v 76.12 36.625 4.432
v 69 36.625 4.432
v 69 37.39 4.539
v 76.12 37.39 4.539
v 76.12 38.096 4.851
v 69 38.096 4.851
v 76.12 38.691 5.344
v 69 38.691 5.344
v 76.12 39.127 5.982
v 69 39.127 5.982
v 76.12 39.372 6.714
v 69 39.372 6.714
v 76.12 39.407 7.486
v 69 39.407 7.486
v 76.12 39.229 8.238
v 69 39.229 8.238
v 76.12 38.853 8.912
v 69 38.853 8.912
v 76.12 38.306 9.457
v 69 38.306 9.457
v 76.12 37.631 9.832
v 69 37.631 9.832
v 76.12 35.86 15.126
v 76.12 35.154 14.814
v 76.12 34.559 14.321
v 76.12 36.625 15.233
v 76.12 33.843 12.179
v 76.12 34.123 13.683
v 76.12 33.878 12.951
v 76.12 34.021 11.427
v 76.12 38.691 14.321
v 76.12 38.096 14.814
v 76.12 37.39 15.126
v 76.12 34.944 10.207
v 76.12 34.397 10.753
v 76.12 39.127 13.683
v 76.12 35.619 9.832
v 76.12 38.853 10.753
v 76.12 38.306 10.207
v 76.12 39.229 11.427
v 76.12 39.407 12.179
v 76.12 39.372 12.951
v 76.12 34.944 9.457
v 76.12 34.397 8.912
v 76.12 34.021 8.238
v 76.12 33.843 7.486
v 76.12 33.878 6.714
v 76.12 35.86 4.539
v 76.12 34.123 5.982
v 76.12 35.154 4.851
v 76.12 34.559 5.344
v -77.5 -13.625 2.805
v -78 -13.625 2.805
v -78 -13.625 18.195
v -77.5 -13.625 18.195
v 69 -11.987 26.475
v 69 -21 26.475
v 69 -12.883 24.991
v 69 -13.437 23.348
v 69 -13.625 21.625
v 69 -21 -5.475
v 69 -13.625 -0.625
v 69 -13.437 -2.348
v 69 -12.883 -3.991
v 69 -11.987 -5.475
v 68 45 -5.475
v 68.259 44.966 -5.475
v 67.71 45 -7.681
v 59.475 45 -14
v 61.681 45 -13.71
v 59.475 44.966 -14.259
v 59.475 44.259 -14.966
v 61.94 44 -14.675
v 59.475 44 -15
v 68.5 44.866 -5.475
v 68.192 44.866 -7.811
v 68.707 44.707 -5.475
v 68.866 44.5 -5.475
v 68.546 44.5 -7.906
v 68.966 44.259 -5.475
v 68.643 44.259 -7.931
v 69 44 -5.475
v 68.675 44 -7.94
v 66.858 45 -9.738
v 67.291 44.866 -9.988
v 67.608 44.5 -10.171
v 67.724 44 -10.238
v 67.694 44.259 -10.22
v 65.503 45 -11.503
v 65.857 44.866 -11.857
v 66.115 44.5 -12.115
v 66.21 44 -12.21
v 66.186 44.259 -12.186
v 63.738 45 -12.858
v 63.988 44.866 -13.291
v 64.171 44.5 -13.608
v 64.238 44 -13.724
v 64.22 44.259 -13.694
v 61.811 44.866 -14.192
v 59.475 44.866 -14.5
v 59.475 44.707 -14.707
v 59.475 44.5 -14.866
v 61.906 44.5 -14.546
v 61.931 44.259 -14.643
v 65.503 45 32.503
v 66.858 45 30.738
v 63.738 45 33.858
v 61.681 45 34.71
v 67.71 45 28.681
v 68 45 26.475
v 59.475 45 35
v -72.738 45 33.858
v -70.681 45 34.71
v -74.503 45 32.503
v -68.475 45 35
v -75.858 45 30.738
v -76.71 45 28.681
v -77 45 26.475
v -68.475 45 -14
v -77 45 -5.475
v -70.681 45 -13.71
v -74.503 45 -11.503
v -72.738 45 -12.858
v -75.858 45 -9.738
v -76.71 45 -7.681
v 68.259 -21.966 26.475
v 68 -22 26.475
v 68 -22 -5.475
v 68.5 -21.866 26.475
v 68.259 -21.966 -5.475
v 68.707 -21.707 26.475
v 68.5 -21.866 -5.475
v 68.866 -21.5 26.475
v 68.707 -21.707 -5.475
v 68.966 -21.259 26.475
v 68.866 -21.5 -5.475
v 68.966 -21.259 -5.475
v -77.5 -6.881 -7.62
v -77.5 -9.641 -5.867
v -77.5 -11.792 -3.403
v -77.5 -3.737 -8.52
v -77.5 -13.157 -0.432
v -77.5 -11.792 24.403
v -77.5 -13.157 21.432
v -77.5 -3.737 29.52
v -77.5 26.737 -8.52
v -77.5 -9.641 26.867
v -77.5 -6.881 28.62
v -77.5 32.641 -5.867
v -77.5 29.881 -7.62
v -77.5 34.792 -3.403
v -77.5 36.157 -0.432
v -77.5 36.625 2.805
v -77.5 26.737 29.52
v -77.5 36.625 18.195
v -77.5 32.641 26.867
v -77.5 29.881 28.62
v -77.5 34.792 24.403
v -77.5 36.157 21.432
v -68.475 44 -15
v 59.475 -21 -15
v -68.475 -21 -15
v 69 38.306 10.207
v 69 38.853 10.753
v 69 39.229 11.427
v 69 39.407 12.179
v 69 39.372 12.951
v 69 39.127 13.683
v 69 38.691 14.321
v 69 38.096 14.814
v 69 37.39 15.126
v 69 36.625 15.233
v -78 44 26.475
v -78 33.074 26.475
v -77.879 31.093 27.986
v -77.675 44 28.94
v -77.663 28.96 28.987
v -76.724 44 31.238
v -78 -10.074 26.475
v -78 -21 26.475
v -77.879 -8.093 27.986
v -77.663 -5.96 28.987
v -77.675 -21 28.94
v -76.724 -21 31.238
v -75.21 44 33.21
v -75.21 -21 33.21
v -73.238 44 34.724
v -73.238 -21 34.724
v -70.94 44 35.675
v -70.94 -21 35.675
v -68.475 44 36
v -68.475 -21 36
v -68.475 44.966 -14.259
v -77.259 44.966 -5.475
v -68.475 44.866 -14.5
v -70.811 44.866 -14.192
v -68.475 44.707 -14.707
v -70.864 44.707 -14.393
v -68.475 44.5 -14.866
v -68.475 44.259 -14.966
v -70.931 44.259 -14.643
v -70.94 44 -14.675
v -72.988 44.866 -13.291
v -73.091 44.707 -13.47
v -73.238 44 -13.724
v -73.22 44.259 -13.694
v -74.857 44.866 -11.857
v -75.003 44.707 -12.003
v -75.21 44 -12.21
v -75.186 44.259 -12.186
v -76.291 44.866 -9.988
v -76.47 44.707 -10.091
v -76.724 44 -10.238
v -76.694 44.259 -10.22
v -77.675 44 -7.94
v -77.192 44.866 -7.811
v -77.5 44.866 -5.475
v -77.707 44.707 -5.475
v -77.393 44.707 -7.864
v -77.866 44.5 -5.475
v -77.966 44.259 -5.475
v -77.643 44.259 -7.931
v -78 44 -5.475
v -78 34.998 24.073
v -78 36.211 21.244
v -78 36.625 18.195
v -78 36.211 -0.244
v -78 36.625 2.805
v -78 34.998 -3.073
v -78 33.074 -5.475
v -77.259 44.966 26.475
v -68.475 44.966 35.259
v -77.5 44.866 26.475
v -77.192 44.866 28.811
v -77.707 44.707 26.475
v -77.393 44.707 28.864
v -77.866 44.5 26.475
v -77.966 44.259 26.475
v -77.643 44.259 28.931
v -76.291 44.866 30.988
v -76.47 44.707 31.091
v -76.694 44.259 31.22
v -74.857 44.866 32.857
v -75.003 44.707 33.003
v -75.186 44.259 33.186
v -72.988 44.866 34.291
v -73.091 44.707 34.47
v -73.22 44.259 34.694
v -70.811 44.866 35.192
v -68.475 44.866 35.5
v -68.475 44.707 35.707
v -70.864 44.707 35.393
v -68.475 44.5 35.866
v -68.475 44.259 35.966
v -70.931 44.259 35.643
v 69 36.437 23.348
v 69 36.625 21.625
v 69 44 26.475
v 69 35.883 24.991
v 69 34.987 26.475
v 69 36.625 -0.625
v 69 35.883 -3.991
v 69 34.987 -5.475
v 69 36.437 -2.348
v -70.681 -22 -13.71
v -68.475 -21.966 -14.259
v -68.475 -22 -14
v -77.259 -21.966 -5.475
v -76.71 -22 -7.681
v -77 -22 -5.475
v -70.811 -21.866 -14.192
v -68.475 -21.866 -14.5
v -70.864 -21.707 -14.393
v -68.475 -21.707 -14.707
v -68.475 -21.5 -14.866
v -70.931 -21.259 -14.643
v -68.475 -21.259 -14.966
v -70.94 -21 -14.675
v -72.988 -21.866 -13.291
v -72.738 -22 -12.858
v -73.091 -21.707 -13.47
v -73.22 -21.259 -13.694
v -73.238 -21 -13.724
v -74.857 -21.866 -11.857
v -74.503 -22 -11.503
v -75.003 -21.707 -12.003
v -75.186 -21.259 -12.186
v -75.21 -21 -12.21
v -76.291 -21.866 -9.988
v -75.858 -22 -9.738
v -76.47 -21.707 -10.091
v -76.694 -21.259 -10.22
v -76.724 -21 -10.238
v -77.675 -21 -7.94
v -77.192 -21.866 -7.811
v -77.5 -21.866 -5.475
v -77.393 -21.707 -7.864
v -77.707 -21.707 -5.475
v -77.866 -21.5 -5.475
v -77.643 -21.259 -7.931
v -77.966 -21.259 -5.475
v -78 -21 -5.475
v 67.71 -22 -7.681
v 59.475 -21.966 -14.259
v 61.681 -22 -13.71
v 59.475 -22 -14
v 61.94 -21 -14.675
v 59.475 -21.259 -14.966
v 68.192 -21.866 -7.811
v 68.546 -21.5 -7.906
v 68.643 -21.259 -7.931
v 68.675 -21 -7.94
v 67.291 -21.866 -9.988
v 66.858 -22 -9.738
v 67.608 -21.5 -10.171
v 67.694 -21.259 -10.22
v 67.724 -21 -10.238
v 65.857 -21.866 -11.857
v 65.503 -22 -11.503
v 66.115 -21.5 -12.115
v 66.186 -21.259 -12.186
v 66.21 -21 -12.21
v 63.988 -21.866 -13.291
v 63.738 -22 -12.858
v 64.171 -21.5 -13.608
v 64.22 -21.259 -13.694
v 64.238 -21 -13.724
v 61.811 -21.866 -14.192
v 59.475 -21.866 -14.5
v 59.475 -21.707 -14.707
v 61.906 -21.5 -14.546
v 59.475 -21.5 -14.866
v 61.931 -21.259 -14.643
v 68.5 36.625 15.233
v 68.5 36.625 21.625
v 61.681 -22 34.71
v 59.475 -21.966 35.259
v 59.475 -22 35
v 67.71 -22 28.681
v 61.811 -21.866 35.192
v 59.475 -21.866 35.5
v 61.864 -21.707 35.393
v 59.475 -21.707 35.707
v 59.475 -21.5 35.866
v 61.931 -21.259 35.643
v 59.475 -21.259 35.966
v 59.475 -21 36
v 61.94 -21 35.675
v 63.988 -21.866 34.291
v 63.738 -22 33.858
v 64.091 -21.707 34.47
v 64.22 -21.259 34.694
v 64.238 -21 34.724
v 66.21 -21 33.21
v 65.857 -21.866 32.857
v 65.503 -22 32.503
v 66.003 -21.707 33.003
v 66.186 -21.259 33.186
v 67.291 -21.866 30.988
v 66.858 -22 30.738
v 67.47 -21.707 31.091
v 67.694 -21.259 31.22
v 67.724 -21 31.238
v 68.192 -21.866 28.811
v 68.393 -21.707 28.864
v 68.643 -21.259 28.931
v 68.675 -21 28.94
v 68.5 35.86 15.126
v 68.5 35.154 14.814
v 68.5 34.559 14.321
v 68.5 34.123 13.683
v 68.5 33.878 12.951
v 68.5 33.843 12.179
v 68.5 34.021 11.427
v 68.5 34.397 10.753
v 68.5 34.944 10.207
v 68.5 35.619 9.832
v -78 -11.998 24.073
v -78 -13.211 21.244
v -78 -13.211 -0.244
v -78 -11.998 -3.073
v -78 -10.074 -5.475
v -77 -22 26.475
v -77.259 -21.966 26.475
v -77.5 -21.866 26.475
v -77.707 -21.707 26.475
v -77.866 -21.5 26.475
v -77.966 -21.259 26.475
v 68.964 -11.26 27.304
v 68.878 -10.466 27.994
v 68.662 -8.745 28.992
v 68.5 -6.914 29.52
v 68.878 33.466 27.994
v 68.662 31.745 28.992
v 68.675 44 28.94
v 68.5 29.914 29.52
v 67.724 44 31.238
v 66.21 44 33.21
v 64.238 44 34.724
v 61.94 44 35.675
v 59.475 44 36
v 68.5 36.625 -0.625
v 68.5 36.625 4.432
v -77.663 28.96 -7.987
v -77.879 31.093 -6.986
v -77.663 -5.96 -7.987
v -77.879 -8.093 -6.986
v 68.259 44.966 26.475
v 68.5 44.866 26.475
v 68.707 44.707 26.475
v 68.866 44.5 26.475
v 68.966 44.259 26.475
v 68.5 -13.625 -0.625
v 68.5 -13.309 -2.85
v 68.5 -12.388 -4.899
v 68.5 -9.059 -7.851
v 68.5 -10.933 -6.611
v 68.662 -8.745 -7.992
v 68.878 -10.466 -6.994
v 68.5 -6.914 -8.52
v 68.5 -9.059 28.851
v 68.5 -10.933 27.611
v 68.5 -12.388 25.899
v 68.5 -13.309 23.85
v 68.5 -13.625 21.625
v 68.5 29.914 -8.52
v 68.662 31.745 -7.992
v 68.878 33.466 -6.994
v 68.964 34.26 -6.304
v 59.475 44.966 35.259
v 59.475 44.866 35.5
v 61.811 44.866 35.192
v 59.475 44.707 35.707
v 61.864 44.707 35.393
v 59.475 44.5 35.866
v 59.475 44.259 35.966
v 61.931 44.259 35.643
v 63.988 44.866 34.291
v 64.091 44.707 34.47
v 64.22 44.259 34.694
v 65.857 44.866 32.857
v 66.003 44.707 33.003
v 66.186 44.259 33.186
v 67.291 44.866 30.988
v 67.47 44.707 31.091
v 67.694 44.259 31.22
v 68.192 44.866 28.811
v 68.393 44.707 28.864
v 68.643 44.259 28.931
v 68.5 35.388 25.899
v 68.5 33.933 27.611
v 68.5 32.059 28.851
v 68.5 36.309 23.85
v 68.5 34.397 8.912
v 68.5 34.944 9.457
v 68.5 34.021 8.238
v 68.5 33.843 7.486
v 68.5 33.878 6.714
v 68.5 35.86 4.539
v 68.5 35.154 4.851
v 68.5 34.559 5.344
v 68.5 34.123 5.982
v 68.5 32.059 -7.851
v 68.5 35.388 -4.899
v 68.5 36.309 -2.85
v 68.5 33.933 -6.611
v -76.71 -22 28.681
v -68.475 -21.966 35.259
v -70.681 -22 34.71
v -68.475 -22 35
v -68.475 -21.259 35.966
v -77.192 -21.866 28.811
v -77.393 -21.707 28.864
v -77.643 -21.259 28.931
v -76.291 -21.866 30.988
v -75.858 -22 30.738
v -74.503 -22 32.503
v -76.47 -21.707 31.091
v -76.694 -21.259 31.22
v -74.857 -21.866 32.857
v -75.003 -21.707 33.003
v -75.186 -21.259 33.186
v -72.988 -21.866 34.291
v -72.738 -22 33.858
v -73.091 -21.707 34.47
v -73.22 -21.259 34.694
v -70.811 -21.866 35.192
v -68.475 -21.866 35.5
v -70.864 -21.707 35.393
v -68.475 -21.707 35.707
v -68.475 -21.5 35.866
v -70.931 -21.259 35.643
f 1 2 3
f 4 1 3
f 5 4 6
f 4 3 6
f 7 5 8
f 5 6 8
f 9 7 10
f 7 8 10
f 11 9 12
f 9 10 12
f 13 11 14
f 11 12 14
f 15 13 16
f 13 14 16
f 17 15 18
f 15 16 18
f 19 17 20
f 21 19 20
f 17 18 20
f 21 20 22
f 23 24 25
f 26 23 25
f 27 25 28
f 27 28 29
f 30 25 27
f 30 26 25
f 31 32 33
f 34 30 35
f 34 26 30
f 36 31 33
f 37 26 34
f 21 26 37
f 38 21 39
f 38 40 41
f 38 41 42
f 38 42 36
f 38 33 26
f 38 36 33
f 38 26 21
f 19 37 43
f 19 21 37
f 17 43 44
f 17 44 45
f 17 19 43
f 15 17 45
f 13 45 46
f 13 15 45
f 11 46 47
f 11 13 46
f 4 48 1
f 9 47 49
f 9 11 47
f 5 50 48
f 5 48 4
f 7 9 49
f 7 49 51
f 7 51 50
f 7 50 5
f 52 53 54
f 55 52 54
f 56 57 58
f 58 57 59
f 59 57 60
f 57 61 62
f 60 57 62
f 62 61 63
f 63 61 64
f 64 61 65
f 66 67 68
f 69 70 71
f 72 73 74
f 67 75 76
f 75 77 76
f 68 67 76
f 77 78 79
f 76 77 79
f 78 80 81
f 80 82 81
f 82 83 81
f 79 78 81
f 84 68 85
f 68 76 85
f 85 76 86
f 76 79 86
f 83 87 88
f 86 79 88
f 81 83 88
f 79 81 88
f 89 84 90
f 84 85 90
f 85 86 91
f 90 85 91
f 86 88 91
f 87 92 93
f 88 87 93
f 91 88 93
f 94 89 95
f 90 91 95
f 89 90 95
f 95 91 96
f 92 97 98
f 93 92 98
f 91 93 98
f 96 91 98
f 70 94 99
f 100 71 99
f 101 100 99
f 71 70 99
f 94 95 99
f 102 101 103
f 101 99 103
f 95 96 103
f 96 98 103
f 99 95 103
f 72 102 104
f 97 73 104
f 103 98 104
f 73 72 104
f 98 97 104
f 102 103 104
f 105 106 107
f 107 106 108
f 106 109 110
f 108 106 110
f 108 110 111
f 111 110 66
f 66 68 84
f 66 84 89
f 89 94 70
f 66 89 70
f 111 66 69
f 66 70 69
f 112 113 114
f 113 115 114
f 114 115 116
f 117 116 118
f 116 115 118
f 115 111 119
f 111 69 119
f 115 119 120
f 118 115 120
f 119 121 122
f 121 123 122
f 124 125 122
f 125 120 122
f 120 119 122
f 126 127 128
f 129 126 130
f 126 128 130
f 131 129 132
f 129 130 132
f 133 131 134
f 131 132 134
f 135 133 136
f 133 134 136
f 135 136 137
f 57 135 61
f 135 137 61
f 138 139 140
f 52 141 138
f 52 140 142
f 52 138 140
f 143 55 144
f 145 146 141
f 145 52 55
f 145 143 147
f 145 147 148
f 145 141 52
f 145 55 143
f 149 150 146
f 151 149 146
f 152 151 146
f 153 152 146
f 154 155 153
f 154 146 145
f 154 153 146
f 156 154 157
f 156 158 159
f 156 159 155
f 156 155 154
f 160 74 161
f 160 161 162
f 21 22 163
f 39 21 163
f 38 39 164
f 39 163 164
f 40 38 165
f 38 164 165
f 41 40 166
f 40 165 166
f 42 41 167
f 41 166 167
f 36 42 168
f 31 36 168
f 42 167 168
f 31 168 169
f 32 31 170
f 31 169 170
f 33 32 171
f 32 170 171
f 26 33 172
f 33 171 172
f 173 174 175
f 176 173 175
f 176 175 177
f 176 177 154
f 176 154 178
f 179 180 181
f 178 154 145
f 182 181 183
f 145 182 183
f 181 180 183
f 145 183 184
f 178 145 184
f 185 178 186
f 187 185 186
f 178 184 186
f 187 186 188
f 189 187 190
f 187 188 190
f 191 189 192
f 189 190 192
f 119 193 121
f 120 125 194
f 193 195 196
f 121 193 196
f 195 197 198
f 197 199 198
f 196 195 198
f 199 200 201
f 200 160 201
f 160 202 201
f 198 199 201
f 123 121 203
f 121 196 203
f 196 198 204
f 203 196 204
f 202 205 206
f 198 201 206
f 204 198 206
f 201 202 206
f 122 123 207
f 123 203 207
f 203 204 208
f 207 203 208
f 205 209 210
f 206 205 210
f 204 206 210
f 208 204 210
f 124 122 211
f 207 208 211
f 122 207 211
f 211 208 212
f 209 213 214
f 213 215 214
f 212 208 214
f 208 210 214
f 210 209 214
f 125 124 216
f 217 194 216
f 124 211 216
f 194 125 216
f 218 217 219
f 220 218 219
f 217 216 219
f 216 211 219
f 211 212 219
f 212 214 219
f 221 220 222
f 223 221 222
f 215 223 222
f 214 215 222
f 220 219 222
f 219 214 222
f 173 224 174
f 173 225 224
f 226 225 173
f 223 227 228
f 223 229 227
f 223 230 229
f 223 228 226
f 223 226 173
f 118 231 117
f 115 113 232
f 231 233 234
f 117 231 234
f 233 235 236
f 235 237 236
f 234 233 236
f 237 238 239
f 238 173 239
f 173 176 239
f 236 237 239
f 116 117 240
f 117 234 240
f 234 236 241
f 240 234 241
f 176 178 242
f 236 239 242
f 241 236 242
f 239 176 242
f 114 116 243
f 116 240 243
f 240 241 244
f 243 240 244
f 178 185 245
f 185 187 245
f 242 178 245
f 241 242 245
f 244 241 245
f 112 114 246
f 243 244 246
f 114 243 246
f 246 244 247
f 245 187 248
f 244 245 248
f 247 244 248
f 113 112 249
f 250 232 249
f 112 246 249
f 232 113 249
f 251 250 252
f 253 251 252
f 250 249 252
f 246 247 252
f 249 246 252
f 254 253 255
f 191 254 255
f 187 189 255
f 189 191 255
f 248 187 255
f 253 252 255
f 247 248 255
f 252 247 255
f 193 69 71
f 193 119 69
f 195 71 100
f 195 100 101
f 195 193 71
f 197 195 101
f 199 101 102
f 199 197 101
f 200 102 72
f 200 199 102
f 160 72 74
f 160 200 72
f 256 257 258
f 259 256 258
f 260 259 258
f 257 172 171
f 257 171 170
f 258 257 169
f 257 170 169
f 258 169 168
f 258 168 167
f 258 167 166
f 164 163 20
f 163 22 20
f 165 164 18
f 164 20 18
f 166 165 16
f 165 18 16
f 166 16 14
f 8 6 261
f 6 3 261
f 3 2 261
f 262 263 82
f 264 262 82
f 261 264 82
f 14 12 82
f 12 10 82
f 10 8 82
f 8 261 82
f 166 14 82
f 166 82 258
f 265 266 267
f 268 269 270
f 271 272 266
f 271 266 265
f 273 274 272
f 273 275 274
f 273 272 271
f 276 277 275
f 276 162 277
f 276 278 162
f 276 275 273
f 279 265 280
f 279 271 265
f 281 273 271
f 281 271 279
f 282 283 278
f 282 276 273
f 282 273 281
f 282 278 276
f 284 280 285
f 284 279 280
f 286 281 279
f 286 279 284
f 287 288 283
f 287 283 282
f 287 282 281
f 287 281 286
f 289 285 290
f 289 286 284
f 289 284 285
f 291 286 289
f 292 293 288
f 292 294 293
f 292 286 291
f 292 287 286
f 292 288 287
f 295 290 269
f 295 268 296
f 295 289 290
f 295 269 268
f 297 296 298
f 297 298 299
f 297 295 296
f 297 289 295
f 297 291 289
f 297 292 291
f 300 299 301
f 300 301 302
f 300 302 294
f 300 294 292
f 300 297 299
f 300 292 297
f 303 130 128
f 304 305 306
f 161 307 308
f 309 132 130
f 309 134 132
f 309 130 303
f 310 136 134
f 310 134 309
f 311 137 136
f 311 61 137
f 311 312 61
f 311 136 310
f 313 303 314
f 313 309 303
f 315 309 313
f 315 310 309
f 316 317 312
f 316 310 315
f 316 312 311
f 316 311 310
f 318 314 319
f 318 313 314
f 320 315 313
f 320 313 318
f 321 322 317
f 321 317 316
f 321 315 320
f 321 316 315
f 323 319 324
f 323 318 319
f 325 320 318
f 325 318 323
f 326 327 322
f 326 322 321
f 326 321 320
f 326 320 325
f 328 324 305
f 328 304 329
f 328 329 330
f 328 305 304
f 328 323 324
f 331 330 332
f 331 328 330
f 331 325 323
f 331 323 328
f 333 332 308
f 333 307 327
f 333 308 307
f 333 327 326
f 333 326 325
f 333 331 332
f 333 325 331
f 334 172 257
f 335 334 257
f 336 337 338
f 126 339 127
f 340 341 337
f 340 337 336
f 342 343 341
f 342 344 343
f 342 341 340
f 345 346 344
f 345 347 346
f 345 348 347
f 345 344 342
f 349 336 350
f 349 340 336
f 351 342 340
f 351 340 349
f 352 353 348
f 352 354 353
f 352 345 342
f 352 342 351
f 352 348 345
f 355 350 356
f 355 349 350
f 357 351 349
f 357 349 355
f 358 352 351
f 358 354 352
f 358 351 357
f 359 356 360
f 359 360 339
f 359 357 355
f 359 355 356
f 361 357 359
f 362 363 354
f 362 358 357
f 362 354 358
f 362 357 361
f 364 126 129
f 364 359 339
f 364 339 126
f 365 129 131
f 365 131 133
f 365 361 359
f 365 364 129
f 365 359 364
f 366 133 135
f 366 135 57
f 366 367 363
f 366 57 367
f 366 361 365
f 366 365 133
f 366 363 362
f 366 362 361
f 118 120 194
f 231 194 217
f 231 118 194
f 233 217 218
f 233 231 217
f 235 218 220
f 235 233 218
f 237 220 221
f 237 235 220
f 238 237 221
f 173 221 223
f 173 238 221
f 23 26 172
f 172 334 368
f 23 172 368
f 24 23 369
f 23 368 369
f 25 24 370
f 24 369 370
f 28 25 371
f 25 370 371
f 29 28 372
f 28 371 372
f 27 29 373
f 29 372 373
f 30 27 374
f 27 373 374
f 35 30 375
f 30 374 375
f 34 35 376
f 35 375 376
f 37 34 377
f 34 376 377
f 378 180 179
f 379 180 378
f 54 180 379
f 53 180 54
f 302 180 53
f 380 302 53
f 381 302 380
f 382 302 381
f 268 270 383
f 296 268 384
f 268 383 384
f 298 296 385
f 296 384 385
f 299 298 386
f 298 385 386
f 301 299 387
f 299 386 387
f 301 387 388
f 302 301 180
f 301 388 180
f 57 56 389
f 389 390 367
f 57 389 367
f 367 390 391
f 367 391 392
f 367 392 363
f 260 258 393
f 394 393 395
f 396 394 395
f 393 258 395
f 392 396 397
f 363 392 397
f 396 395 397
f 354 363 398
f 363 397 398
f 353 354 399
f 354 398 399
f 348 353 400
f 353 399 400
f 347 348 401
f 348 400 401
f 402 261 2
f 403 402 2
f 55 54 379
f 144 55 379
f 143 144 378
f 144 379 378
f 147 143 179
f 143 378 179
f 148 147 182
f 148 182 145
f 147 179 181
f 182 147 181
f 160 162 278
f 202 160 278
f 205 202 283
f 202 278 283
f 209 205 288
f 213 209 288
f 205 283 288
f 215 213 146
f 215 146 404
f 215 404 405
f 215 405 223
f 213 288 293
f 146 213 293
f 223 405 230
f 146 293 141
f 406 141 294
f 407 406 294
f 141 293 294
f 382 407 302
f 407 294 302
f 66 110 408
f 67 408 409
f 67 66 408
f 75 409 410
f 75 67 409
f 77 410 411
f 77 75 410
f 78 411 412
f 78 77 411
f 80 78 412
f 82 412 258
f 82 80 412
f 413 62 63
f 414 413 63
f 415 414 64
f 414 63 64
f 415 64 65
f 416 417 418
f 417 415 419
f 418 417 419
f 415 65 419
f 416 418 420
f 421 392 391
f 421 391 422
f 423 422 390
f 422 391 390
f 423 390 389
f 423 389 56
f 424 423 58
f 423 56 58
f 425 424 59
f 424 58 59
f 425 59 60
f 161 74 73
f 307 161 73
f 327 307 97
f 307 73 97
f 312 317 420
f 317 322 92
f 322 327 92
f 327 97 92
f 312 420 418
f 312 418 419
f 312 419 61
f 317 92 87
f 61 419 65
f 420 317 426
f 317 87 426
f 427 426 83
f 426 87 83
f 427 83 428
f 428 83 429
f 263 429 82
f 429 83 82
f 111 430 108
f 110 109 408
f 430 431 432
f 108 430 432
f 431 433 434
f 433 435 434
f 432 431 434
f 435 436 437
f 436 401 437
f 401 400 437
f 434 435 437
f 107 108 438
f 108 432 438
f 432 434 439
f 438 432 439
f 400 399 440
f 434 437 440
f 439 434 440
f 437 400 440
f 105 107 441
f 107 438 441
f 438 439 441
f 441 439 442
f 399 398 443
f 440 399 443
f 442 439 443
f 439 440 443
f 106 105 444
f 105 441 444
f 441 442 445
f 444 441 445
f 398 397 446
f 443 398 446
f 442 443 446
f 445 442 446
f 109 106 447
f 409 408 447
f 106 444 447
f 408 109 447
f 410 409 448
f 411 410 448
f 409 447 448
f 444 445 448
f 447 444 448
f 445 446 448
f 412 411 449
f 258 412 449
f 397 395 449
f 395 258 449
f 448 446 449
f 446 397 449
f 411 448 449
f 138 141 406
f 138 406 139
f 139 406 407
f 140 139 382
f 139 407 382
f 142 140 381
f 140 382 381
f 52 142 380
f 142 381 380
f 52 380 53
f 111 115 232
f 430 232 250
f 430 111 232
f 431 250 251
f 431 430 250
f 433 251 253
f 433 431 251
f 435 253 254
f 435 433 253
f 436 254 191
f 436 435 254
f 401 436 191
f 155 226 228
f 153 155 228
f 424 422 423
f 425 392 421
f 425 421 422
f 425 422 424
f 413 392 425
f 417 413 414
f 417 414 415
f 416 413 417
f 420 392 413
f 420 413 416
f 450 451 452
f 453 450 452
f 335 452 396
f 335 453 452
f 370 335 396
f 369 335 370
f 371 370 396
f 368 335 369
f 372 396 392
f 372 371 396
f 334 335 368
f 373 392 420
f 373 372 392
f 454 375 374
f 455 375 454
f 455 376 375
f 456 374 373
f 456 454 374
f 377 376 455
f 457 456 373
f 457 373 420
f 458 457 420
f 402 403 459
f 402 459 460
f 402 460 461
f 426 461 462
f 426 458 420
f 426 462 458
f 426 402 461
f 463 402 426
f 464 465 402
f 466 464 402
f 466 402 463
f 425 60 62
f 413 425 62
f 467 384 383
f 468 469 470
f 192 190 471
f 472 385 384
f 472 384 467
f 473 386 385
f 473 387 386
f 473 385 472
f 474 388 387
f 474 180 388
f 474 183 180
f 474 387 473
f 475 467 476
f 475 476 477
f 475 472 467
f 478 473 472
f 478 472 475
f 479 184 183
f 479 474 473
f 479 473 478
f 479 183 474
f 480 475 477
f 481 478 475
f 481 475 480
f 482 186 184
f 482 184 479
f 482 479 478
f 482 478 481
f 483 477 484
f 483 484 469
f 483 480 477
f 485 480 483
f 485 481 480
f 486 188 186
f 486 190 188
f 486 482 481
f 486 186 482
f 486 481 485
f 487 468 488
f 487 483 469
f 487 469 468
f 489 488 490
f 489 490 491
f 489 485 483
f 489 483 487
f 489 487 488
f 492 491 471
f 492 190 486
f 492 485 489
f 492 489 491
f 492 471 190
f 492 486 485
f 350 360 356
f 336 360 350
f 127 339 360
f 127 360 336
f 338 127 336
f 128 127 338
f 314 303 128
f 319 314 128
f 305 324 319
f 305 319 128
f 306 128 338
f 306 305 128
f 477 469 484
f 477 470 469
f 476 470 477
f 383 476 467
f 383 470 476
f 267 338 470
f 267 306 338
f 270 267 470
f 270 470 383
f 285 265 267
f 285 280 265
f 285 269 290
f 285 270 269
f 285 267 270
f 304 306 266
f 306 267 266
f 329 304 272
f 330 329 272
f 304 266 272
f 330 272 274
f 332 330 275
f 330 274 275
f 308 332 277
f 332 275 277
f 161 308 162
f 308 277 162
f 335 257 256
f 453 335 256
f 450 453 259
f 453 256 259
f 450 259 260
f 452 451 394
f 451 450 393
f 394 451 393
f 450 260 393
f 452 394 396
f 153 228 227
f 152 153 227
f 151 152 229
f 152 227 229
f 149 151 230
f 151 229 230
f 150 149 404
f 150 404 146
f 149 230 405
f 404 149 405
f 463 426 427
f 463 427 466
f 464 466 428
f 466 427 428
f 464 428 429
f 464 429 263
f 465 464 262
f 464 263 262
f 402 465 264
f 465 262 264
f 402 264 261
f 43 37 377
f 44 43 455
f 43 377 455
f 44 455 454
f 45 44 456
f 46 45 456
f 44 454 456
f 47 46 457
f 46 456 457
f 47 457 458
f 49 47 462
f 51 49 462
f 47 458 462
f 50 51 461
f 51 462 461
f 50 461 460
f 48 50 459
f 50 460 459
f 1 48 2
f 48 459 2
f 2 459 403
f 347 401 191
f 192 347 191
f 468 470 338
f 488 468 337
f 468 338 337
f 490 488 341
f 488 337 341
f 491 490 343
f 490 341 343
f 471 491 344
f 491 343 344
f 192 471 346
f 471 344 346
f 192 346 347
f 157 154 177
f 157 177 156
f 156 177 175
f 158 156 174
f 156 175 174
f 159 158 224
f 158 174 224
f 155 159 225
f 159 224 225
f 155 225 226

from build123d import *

# Parameters (mm, degrees)
SKETCH1_W                = 147
SKETCH1_H                = 67.000000112
BOSS_EXTRUDE1_DEPTH      = 51
CUT_EXTRUDE1_DEPTH       = 0.5
CUT_EXTRUDE2_DEPTH       = 0.5
FILLET1_R                = 9.525
FILLET2_R                = 1
BOSS_EXTRUDE2_DEPTH      = 7.62
BOSS_EXTRUDE2_DEPTH_BACK = 2.54


with BuildPart() as part:
    # Sketch1 → Boss-Extrude1 (new body)
    with BuildSketch(Plane(origin=(0, 0, -15), x_dir=(-1, 0, 0), z_dir=(0, 0, -1))):
        with Locations((4.5, 11.500000056)):
            Rectangle(SKETCH1_W, SKETCH1_H)
    extrude(amount=-BOSS_EXTRUDE1_DEPTH)

    # Sketch2 → Cut-Extrude1 (cut)
    with BuildSketch(Plane(origin=(69, 0, 0), x_dir=(0, 0, -1), z_dir=(1, 0, 0))):
        with BuildLine():
            Line((-29.625, 28.625000098), (-29.625, -5.624999986))
            ThreePointArc((-29.625, -5.624999986), (-27.281854249, -11.281854235), (-21.625, -13.624999986))
            Line((-21.625, -13.624999986), (0.625, -13.624999986))
            ThreePointArc((0.625, -13.624999986), (6.281854249, -11.281854235), (8.625, -5.624999986))
            Line((8.625, -5.624999986), (8.625, 28.625000098))
            ThreePointArc((8.625, 28.625000098), (6.281854249, 34.281854347), (0.625, 36.625000098))
            Line((0.625, 36.625000098), (-21.625, 36.625000098))
            ThreePointArc((-21.625, 36.625000098), (-27.281854249, 34.281854347), (-29.625, 28.625000098))
        make_face()
    extrude(amount=-CUT_EXTRUDE1_DEPTH, mode=Mode.SUBTRACT)

    # Sketch3 → Cut-Extrude2 (cut)
    with BuildSketch(Plane.ZY.offset(78)):
        with BuildLine():
            Line((18.195, 36.625000098), (2.805, 36.625000098))
            ThreePointArc((2.805, 36.625000098), (-5.277230509, 33.277230607), (-8.625, 25.195000098))
            Line((-8.625, 25.195000098), (-8.625, -2.194999986))
            ThreePointArc((-8.625, -2.194999986), (-5.277230509, -10.277230495), (2.805, -13.624999986))
            Line((2.805, -13.624999986), (18.195, -13.624999986))
            ThreePointArc((18.195, -13.624999986), (26.277230509, -10.277230495), (29.625, -2.194999986))
            Line((29.625, -2.194999986), (29.625, 25.195000098))
            ThreePointArc((29.625, 25.195000098), (26.277230509, 33.277230607), (18.195, 36.625000098))
        make_face()
    extrude(amount=-CUT_EXTRUDE2_DEPTH, mode=Mode.SUBTRACT)

    # Fillet1
    # the kernel refuses this fillet: 9.525 mm, written as the material it takes off along each edge
    with BuildSketch(Plane(origin=(-78, -45.8125, -15), x_dir=(0, 0, 1), z_dir=(0, 1, 0)), Plane(origin=(69, 68.812500112, -15), x_dir=(0, 0, 1), z_dir=(0, -1, 0))) as fillet1_piece_1:
        with BuildLine():
            CenterArc((FILLET1_R, FILLET1_R), FILLET1_R, 180, 90)
            Line((0, FILLET1_R), (0, 0))
            Line((0, 0), (FILLET1_R, 0))
        make_face()
    extrude(amount=114.625000112, mode=Mode.SUBTRACT)
    with BuildSketch(Plane(origin=(-78, -45.8125, 36), x_dir=(0, 0, -1), z_dir=(0, 1, 0)), Plane(origin=(69, 68.812500112, 36), x_dir=(0, 0, -1), z_dir=(0, -1, 0))) as fillet1_piece_2:
        with BuildLine():
            CenterArc((FILLET1_R, -FILLET1_R), FILLET1_R, 90, 90)
            Line((0, -FILLET1_R), (0, 0))
            Line((0, 0), (FILLET1_R, 0))
        make_face()
    extrude(amount=114.625000112, mode=Mode.SUBTRACT)

    # Fillet2
    fillet2_edges = [part.edges().sort_by_distance(p)[0] for p in [
        (-4.5, -22, -15),
        (-4.5, 45.000000112, -15),
        (-78, 45.000000112, 10.5),
        (-4.5, 45.000000112, 36),
        (69, 45.000000112, 10.5),
        (66.210192091, 45.000000112, 33.210192091),
        (66.210192091, 45.000000112, -12.210192091),
        (-75.210192091, 45.000000112, 33.210192091),
        (-75.210192091, 45.000000112, -12.210192091),
        (-78, -22, 10.5),
        (69, -22, 10.5),
        (-4.5, -22, 36),
        (66.210192091, -22, 33.210192091),
        (66.210192091, -22, -12.210192091),
        (-75.210192091, -22, 33.210192091),
        (-75.210192091, -22, -12.210192091),
    ]]
    fillet(fillet2_edges, radius=FILLET2_R)

    # Sketch5 → Boss-Extrude2 (add, two sides: drawn at the far end of the back side and taken through both)
    with BuildSketch(Plane(origin=(68.5, 0, 0), x_dir=(0, 0, -1), z_dir=(1, 0, 0)).offset(-BOSS_EXTRUDE2_DEPTH_BACK)):
        with BuildLine():
            Line((-10.019743612, 36.625000098), (-9.645122715, 36.625000098))
            ThreePointArc((-9.645122715, 36.625000098), (-9.692349462, 37.136539634), (-9.832433164, 37.63078615))
            ThreePointArc((-9.832433164, 37.63078615), (-9.972516865, 37.136539634), (-10.019743612, 36.625000098))
        make_face()
        with BuildLine():
            Line((-4.431743612, 36.625000098), (-9.645122715, 36.625000098))
            ThreePointArc((-9.645122715, 36.625000098), (-9.692349462, 36.113460562), (-9.832433164, 35.619214046))
            ThreePointArc((-9.832433164, 35.619214046), (-6.714204076, 33.878226845), (-4.431743612, 36.625000098))
        make_face()
        with BuildLine():
            ThreePointArc((-9.832433164, 37.63078615), (-9.692349462, 37.136539634), (-9.645122715, 36.625000098))
            Line((-9.645122715, 36.625000098), (-4.431743612, 36.625000098))
            ThreePointArc((-4.431743612, 36.625000098), (-6.714204076, 39.371773351), (-9.832433164, 37.63078615))
        make_face()
        with BuildLine():
            ThreePointArc((-9.832433164, 35.619214046), (-9.692349462, 36.113460562), (-9.645122715, 36.625000098))
            Line((-9.645122715, 36.625000098), (-10.019743612, 36.625000098))
            ThreePointArc((-10.019743612, 36.625000098), (-9.972516865, 36.113460562), (-9.832433164, 35.619214046))
        make_face()
        with BuildLine():
            ThreePointArc((-10.019743612, 36.625000098), (-9.972516865, 37.136539634), (-9.832433164, 37.63078615))
            ThreePointArc((-9.832433164, 37.63078615), (-12.950662251, 39.371773351), (-15.233122715, 36.625000098))
            Line((-15.233122715, 36.625000098), (-10.019743612, 36.625000098))
        make_face()
        with BuildLine():
            ThreePointArc((-15.233122715, 36.625000098), (-12.950662251, 33.878226845), (-9.832433164, 35.619214046))
            ThreePointArc((-9.832433164, 35.619214046), (-9.972516865, 36.113460562), (-10.019743612, 36.625000098))
            Line((-10.019743612, 36.625000098), (-15.233122715, 36.625000098))
        make_face()
    extrude(amount=BOSS_EXTRUDE2_DEPTH + BOSS_EXTRUDE2_DEPTH_BACK)


solid = part.part
